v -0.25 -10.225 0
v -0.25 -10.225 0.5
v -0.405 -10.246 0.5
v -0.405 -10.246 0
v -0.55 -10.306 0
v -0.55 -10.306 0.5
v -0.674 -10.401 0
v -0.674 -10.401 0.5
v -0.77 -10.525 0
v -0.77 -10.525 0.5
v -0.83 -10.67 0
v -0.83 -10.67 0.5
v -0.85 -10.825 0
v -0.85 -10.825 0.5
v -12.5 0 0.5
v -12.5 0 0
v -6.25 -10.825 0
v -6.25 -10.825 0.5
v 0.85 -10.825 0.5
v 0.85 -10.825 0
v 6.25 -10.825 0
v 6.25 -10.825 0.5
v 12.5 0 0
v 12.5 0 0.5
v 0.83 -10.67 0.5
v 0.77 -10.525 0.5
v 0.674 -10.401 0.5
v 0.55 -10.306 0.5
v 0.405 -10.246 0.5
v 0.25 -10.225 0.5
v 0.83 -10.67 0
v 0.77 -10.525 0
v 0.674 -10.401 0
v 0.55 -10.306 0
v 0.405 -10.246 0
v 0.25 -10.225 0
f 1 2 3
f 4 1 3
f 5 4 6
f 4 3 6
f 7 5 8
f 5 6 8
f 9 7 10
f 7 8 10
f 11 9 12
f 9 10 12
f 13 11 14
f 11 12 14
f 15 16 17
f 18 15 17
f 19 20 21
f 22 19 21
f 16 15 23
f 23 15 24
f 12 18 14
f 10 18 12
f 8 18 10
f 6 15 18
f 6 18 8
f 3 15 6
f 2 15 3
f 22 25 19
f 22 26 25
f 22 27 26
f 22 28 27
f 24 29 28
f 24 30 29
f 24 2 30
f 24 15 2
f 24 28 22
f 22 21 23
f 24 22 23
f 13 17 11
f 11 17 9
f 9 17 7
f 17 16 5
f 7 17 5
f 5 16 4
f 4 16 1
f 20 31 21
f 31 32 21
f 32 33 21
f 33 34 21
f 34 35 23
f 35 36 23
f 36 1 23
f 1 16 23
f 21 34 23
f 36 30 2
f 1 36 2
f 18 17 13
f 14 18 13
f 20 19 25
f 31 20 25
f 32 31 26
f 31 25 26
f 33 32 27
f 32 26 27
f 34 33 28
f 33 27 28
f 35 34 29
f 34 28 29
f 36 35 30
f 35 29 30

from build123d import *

# Parameters (mm, degrees)
F1_DEPTH = 0.5
F3_DEPTH = 0.501
F5_DEPTH = 0.501


with BuildPart() as f1:
    # F0 (on Top) → F1 (new body)
    with BuildSketch(Plane.XY):
        Polygon((6.25, -10.825318), (12.5, 0), (6.25, 10.825318), (-6.25, 10.825318), (-12.5, 0), (-6.25, -10.825318), align=None)
    extrude(amount=F1_DEPTH)

    # F2 (on face) → F3 (cut, through all)
    with BuildSketch(Plane.XY.offset(0.5)):
        with BuildLine():
            ThreePointArc((0.85, -10.825318), (0.674264, -10.401053), (0.25, -10.225318))
            Line((0.25, -10.225318), (-0.25, -10.225318))
            ThreePointArc((-0.25, -10.225318), (-0.674264, -10.401053), (-0.85, -10.825318))
            Line((-0.85, -10.825318), (0.85, -10.825318))
        make_face()
    extrude(amount=-F3_DEPTH, mode=Mode.SUBTRACT)

    # F4 (on face) → F5 (cut, through all)
    with BuildSketch(Plane.XY.offset(0.5)):
        Polygon((-6.25, 10.825318), (-12.5, 0), (12.5, 0), (6.25, 10.825318), align=None)
    extrude(amount=-F5_DEPTH, mode=Mode.SUBTRACT)


solid = f1.part
